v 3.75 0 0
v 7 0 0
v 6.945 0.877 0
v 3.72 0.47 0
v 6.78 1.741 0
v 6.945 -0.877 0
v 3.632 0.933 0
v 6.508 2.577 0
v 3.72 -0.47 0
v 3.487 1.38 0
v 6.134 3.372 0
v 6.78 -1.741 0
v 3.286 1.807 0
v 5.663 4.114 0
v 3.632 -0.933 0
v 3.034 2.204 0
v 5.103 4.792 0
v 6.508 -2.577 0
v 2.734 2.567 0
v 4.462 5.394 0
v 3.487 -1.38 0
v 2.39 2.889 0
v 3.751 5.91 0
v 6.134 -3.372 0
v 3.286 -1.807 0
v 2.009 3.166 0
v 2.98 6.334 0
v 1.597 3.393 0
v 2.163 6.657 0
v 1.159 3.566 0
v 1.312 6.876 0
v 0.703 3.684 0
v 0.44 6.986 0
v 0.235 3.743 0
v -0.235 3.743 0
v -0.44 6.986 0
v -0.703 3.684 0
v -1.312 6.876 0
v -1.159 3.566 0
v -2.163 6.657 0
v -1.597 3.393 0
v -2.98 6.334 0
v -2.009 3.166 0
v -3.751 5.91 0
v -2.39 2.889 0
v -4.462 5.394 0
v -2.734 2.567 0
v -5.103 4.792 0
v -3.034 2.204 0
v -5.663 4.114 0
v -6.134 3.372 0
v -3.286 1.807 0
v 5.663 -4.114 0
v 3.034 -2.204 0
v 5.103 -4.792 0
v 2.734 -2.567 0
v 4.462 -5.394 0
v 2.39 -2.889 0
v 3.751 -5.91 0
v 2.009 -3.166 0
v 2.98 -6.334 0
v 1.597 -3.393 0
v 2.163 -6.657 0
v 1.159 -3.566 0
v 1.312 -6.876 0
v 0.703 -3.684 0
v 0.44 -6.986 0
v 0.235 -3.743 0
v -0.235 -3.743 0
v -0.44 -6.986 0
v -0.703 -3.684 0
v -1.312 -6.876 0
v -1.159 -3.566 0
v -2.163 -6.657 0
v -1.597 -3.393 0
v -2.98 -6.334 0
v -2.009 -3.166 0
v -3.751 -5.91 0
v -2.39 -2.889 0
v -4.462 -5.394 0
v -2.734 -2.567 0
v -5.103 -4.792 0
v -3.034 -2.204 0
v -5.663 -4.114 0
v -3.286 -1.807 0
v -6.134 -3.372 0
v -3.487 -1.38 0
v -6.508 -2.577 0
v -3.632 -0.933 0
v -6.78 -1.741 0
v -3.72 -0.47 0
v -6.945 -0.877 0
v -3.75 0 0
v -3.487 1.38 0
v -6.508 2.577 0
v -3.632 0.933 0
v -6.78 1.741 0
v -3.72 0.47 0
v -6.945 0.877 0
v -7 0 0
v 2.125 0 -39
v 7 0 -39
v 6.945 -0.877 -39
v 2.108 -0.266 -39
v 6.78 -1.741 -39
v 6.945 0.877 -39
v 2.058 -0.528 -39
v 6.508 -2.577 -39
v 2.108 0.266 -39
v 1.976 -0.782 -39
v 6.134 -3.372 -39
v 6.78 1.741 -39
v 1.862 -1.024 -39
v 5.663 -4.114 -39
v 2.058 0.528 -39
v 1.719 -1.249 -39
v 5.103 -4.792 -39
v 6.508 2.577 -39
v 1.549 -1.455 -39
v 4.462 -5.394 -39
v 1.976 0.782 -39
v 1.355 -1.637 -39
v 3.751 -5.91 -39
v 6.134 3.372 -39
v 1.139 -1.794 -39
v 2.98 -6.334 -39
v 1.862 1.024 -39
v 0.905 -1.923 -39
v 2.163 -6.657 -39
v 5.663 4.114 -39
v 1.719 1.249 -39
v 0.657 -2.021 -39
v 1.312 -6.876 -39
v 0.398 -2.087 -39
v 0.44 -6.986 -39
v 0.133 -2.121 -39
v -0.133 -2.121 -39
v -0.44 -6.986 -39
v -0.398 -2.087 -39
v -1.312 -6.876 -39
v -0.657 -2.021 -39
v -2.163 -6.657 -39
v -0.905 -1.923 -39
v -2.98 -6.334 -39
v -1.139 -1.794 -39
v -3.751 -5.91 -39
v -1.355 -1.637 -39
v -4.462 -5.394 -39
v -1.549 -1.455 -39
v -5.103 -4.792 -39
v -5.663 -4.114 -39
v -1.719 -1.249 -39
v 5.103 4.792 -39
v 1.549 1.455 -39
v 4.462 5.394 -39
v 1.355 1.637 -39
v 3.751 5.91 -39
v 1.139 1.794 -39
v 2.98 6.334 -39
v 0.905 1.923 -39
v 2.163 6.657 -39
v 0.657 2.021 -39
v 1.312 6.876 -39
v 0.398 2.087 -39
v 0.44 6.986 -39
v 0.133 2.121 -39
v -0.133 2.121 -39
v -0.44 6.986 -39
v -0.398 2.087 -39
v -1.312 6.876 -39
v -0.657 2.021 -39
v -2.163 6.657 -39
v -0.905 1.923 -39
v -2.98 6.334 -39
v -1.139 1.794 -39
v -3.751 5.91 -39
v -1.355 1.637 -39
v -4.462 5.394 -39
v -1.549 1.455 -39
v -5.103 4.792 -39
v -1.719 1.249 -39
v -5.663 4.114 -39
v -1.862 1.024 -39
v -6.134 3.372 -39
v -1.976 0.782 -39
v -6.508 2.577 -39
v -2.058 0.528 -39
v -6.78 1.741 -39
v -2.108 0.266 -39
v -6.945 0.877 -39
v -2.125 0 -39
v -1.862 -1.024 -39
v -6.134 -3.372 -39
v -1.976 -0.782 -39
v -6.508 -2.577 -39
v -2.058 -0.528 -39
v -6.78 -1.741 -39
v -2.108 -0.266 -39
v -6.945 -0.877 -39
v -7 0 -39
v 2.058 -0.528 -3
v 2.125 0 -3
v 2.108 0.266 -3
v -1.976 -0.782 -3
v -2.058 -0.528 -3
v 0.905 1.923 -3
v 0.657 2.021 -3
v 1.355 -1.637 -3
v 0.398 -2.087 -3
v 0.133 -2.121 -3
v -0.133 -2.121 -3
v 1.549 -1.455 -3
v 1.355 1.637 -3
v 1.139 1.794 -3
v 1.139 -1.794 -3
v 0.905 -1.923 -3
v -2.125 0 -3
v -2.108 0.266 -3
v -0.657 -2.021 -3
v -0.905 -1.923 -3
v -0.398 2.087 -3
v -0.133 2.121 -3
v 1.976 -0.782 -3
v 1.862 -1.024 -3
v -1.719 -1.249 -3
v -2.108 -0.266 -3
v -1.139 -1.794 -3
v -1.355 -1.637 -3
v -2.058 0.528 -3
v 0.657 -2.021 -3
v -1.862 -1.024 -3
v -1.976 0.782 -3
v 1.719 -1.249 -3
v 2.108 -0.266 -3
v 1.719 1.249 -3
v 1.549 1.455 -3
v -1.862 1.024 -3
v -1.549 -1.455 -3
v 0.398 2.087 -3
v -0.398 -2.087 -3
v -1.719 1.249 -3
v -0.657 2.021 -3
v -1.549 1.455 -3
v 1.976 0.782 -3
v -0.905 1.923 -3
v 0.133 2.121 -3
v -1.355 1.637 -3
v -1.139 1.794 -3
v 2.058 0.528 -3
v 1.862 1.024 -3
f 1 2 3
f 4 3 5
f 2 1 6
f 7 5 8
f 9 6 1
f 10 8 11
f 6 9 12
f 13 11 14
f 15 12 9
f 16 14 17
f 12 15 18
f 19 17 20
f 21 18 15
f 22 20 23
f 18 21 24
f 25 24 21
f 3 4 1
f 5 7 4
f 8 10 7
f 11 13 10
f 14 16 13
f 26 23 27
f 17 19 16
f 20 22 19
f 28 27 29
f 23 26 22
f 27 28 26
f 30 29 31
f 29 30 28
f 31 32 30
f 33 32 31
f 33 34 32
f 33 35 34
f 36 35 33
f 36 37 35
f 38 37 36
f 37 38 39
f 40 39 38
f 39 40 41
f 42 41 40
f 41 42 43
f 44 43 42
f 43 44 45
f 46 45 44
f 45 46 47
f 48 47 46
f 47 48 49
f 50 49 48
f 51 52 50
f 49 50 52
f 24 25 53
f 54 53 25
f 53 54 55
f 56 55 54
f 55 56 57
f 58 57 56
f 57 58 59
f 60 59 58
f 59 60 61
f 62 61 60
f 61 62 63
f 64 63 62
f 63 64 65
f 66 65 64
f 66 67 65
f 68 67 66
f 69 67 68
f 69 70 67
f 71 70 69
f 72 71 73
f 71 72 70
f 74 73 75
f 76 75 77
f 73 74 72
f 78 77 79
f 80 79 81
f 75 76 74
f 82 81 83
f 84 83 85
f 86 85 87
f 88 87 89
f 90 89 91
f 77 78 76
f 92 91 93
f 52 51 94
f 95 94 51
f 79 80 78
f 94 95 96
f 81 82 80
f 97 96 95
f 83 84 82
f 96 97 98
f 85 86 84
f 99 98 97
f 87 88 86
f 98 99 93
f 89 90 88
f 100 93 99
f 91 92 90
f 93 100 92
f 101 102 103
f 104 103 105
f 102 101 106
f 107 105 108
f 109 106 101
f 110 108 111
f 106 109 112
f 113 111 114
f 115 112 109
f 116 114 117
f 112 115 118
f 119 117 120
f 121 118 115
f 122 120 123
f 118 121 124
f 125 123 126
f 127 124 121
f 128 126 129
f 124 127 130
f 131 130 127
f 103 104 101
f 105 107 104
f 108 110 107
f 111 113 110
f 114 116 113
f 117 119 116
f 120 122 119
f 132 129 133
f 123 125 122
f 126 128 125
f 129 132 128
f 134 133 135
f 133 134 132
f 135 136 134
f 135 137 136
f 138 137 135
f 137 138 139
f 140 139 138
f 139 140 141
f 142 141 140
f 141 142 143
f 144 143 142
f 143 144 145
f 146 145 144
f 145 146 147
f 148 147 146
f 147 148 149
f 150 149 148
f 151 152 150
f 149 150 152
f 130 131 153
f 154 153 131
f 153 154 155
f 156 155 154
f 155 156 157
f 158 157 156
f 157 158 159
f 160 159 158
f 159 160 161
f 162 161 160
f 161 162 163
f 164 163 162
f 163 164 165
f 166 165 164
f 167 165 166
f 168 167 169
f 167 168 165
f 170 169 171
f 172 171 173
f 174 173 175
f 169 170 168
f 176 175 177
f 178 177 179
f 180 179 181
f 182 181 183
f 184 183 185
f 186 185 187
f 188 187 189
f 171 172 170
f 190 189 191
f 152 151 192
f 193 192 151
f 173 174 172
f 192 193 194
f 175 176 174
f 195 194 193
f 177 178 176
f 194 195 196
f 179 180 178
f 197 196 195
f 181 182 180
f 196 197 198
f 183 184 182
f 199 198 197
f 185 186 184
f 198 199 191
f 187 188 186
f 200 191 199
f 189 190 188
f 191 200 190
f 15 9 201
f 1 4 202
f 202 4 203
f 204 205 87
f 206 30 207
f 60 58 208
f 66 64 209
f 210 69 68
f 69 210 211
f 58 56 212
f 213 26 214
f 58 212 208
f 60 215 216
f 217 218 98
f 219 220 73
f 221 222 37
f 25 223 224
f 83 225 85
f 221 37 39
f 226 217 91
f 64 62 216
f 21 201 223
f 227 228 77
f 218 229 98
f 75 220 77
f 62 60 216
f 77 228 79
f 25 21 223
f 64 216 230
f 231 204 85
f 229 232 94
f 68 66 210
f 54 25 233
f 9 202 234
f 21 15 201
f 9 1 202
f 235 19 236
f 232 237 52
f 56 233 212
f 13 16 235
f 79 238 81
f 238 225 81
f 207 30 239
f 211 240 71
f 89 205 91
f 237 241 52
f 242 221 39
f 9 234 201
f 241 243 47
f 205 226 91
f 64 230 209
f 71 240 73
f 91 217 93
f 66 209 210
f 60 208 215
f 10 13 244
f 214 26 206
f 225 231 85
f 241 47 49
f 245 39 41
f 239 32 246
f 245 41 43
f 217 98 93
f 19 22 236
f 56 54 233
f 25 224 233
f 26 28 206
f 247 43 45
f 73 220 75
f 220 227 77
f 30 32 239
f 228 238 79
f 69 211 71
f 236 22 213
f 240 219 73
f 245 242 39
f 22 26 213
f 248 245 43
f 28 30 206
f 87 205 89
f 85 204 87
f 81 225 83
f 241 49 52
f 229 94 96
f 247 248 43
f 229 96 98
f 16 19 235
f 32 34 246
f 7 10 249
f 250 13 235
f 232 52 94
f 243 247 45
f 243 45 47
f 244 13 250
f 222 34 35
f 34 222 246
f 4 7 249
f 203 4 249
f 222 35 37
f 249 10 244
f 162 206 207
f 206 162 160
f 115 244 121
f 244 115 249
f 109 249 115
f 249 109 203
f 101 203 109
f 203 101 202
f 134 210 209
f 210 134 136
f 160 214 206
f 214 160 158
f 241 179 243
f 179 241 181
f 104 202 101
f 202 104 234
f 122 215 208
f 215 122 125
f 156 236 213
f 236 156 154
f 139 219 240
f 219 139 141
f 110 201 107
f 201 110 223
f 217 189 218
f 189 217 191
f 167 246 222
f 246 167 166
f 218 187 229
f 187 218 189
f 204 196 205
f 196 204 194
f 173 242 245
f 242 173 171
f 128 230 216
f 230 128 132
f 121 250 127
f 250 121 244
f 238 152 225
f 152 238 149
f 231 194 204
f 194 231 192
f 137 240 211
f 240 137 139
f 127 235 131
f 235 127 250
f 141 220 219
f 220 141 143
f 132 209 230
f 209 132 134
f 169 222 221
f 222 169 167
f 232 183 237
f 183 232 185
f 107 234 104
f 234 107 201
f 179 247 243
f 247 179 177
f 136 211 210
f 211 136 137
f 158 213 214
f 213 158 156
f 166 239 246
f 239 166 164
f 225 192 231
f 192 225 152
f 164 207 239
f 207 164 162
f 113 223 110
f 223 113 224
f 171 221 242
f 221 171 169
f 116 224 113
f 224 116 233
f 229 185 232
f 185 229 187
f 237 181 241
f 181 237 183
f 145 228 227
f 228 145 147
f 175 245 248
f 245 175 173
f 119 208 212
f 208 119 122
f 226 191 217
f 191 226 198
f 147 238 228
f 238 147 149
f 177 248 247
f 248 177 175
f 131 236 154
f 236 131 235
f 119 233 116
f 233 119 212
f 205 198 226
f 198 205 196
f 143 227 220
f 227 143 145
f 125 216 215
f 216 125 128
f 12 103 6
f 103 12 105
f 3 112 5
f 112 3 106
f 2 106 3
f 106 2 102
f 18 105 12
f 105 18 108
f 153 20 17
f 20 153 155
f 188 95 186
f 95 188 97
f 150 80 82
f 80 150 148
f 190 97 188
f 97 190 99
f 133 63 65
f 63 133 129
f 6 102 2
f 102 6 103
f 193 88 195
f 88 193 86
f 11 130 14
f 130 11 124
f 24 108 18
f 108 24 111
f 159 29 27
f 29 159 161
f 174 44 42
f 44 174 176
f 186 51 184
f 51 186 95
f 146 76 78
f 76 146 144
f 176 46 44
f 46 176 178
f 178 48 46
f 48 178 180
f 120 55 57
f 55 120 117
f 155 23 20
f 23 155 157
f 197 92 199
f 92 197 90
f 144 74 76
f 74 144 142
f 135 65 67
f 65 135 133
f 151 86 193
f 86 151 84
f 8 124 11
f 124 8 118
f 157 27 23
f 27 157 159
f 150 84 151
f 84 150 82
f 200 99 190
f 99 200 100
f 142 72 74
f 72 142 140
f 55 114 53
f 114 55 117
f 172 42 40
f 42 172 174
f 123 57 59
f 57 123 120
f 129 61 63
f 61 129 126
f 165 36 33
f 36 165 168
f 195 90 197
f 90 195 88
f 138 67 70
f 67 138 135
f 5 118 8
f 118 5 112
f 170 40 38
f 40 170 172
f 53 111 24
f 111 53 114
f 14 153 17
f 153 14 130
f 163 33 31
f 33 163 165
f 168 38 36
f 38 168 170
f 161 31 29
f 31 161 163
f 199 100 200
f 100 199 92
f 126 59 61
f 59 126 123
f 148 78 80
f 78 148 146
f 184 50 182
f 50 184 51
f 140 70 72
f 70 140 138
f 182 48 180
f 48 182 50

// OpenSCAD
$fn = 50;


difference() {
	union() {
		translate(v = [0, 0, -39.0000000000]) {
			cylinder(h = 39, r = 7.0000000000);
		}
		cylinder(h = 0, r = 13.0000000000);
	}
	union() {
		translate(v = [0, 0, 0]) {
			rotate(a = [0, 0, 0]) {
				difference() {
					union() {
						#translate(v = [0, 0, -39.0000000000]) {
							cylinder(h = 39, r = 2.0000000000);
						}
						#translate(v = [0, 0, -3]) {
							cylinder(h = 3, r1 = 2.1250000000, r2 = 3.7500000000);
						}
						#translate(v = [0, 0, -39.0000000000]) {
							cylinder(h = 39, r = 2.1250000000);
						}
						#translate(v = [0, 0, -39.0000000000]) {
							cylinder(h = 39, r = 2.0000000000);
						}
					}
					union();
				}
			}
		}
	}
}
